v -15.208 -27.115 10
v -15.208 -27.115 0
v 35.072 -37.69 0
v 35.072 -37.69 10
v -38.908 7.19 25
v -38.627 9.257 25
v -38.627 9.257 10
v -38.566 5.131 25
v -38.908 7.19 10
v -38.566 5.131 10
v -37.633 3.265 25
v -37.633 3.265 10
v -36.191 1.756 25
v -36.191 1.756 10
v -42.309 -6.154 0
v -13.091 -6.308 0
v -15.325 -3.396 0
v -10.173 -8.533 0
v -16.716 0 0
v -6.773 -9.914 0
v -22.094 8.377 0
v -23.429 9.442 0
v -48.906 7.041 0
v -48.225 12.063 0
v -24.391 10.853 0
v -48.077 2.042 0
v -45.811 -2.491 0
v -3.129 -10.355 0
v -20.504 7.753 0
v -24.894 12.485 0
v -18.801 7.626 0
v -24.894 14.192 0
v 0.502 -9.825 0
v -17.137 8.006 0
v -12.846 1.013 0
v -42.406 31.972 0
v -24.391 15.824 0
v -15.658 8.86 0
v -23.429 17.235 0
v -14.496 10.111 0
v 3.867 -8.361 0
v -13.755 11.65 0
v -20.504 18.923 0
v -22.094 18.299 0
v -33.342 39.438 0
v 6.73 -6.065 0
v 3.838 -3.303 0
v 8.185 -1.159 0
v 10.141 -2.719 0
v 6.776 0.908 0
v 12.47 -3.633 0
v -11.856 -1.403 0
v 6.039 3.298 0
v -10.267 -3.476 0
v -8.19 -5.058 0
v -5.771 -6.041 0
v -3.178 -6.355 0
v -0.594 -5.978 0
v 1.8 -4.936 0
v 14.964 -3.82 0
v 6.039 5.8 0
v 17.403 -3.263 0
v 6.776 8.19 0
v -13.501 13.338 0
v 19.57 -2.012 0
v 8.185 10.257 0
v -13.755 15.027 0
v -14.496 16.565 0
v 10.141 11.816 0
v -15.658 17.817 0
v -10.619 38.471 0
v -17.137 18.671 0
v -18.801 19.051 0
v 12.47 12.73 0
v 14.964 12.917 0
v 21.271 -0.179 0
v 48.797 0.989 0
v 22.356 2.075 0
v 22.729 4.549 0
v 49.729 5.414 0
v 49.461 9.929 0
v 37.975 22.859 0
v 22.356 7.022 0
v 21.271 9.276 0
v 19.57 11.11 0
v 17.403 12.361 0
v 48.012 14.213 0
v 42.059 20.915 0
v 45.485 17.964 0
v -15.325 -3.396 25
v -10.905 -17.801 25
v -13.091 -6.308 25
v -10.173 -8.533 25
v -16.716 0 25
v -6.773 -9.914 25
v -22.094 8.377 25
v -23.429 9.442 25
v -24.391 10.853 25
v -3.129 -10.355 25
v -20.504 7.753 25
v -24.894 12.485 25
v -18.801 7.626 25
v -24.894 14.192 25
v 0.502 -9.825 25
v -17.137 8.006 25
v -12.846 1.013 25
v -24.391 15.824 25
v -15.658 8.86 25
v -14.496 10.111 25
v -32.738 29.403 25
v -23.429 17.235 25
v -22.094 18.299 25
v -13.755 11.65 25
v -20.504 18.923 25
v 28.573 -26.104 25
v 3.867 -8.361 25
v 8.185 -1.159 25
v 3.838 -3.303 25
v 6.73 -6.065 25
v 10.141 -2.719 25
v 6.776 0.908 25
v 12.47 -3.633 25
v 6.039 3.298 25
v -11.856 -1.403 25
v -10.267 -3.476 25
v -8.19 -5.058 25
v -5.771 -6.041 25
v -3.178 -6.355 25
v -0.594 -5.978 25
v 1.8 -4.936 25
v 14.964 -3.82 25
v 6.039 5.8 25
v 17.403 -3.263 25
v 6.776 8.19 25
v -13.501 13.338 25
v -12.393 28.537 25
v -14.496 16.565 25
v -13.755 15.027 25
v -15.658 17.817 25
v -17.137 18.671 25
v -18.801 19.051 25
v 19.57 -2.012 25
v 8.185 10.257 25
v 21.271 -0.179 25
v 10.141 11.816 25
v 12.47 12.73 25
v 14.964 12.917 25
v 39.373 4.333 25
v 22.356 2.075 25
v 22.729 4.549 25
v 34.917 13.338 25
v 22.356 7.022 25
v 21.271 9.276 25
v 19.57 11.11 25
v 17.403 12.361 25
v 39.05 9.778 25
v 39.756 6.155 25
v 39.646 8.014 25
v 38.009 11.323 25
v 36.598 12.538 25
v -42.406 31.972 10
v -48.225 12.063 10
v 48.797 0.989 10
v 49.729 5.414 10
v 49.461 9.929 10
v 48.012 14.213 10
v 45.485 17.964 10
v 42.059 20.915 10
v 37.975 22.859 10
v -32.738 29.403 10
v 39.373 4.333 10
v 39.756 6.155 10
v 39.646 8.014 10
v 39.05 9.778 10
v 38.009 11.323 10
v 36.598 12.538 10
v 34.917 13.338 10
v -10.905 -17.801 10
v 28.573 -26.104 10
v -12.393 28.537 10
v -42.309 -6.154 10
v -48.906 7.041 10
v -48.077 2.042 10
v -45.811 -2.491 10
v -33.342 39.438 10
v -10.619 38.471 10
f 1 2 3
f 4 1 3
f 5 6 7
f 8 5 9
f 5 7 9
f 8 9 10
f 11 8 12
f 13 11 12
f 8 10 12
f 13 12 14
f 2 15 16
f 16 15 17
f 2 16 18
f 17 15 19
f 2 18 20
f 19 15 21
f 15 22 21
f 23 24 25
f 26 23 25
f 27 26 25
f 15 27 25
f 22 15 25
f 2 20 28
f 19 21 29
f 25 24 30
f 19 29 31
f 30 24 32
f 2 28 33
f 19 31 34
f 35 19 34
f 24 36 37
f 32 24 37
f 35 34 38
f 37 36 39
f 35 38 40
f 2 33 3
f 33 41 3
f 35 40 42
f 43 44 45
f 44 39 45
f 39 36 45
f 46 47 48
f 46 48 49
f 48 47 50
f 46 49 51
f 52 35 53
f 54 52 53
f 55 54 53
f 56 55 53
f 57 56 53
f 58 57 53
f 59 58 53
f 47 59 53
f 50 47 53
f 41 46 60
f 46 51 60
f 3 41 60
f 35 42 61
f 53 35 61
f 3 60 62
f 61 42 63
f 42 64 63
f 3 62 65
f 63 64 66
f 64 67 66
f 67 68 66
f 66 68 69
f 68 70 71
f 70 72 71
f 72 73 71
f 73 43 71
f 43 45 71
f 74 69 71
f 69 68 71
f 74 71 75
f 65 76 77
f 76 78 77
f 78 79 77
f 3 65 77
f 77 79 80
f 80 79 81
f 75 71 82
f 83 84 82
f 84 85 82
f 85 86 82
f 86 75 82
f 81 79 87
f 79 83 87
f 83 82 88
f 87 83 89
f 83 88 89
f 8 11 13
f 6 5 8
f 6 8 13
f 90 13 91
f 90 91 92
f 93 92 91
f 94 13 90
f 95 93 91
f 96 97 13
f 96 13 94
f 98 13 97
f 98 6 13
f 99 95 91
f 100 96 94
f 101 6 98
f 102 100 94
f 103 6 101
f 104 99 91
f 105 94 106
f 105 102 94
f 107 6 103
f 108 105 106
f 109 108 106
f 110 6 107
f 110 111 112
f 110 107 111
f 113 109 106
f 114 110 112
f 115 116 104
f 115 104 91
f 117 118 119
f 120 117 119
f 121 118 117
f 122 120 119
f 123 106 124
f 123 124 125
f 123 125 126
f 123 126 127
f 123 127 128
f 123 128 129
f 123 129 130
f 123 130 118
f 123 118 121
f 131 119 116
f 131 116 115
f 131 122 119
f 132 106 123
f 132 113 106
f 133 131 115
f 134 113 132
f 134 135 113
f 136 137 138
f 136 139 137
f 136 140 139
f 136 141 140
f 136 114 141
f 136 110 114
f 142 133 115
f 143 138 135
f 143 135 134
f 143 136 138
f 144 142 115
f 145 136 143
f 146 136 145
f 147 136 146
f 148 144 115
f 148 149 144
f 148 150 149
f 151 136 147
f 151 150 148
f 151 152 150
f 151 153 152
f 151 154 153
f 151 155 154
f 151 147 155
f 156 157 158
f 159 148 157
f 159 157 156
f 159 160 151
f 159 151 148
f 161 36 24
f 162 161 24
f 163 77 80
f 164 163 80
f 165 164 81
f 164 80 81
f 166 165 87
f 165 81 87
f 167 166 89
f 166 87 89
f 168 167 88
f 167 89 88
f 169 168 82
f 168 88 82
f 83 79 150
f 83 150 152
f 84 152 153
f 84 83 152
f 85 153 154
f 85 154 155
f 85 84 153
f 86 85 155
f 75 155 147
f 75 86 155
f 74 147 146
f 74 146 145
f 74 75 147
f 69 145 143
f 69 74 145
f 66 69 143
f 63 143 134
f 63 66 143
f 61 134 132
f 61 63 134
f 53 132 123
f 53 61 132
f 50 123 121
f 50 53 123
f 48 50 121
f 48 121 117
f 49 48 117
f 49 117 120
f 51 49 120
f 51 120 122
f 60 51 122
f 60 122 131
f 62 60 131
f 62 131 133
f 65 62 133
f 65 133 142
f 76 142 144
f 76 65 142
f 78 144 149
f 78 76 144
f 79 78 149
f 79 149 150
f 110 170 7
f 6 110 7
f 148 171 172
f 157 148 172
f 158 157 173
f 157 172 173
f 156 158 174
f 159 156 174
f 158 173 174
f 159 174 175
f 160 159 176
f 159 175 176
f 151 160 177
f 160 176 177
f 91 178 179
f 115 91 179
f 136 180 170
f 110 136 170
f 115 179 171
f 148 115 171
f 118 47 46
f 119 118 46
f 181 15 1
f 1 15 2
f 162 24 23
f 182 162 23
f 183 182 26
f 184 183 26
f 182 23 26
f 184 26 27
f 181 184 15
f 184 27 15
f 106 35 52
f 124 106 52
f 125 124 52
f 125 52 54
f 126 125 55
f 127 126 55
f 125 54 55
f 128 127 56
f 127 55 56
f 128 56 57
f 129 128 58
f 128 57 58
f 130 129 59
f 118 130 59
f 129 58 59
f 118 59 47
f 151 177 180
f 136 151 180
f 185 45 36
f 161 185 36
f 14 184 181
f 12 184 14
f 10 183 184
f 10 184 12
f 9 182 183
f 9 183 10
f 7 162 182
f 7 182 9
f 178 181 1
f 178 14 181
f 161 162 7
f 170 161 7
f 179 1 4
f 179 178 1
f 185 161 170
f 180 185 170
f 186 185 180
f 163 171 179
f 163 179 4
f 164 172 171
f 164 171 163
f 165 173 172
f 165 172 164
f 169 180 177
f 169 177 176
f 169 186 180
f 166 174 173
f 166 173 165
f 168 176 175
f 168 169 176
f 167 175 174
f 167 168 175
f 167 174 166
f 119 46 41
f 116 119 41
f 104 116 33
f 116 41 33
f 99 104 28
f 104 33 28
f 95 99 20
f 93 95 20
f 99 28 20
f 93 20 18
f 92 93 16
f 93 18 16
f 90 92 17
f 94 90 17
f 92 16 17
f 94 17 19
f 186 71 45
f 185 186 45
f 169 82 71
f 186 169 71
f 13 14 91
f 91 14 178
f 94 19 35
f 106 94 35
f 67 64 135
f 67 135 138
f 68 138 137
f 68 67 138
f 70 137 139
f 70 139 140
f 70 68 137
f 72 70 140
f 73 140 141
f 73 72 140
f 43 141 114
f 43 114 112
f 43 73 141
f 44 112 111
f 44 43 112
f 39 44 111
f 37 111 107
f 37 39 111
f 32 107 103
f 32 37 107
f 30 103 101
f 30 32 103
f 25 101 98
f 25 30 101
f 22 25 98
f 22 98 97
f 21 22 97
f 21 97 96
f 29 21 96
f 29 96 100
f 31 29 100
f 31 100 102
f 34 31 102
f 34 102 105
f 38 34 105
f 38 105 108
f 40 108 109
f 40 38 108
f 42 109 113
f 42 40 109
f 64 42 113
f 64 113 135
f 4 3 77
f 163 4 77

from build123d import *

# Parameters (mm, degrees)
F0_R     = 5.728623
F0_R_2   = 8.391993
F1_DEPTH = 25
F2_DEPTH = 10


with BuildPart() as f1:
    # F0 (on Top) → F1 (new body)
    with BuildSketch(Plane.XY):
        with BuildLine():
            Line((-12.392675, 28.53726), (-32.738149, 29.403025))
            Line((-32.738149, 29.403025), (-38.62714, 9.257409))
            ThreePointArc((-38.62714, 9.257409), (-38.565992, 5.131079), (-36.190918, 1.756265))
            Line((-36.190918, 1.756265), (-10.90472, -17.801028))
            Line((-10.90472, -17.801028), (28.572614, -26.104371))
            Line((28.572614, -26.104371), (39.37257, 4.333038))
            ThreePointArc((39.37257, 4.333038), (39.049502, 9.778257), (34.916635, 13.33834))
            Line((34.916635, 13.33834), (-12.392675, 28.53726))
        make_face()
        with BuildLine():
            ThreePointArc((6.730466, -6.065113), (-6.772657, -9.913719), (-16.715707, 0))
            Line((-16.715707, 0), (-12.846154, 1.013192))
            ThreePointArc((-12.846154, 1.013192), (-5.770901, -6.041189), (3.837619, -3.302607))
            Line((3.837619, -3.302607), (6.730466, -6.065113))
        make_face(mode=Mode.SUBTRACT)
        with Locations((-19.229598, 13.33834)):
            Circle(F0_R, mode=Mode.SUBTRACT)
        with Locations((14.337256, 4.548747)):
            Circle(F0_R_2, mode=Mode.SUBTRACT)
    extrude(amount=F1_DEPTH)

    # F0 (on Top) → F2 (join)
    with BuildSketch(Plane.XY):
        with BuildLine():
            Line((37.975333, 22.859074), (-10.619018, 38.470835))
            Line((-10.619018, 38.470835), (-33.34205, 39.437773))
            Line((-33.34205, 39.437773), (-42.405677, 31.972025))
            Line((-42.405677, 31.972025), (-48.22545, 12.063199))
            ThreePointArc((-48.22545, 12.063199), (-48.076948, 2.04211), (-42.30891, -6.153866))
            Line((-42.30891, -6.153866), (-15.208019, -27.114711))
            Line((-15.208019, -27.114711), (35.072481, -37.690305))
            Line((35.072481, -37.690305), (48.796888, 0.989053))
            ThreePointArc((48.796888, 0.989053), (48.012296, 14.213157), (37.975333, 22.859074))
        make_face()
        with BuildLine():
            Line((-38.62714, 9.257409), (-32.738149, 29.403025))
            Line((-32.738149, 29.403025), (-12.392675, 28.53726))
            Line((-12.392675, 28.53726), (34.916635, 13.33834))
            ThreePointArc((34.916635, 13.33834), (39.049502, 9.778257), (39.37257, 4.333038))
            Line((39.37257, 4.333038), (28.572614, -26.104371))
            Line((28.572614, -26.104371), (-10.90472, -17.801028))
            Line((-10.90472, -17.801028), (-36.190918, 1.756265))
            ThreePointArc((-36.190918, 1.756265), (-38.565992, 5.131079), (-38.62714, 9.257409))
        make_face(mode=Mode.SUBTRACT)
    extrude(amount=F2_DEPTH)


solid = f1.part
